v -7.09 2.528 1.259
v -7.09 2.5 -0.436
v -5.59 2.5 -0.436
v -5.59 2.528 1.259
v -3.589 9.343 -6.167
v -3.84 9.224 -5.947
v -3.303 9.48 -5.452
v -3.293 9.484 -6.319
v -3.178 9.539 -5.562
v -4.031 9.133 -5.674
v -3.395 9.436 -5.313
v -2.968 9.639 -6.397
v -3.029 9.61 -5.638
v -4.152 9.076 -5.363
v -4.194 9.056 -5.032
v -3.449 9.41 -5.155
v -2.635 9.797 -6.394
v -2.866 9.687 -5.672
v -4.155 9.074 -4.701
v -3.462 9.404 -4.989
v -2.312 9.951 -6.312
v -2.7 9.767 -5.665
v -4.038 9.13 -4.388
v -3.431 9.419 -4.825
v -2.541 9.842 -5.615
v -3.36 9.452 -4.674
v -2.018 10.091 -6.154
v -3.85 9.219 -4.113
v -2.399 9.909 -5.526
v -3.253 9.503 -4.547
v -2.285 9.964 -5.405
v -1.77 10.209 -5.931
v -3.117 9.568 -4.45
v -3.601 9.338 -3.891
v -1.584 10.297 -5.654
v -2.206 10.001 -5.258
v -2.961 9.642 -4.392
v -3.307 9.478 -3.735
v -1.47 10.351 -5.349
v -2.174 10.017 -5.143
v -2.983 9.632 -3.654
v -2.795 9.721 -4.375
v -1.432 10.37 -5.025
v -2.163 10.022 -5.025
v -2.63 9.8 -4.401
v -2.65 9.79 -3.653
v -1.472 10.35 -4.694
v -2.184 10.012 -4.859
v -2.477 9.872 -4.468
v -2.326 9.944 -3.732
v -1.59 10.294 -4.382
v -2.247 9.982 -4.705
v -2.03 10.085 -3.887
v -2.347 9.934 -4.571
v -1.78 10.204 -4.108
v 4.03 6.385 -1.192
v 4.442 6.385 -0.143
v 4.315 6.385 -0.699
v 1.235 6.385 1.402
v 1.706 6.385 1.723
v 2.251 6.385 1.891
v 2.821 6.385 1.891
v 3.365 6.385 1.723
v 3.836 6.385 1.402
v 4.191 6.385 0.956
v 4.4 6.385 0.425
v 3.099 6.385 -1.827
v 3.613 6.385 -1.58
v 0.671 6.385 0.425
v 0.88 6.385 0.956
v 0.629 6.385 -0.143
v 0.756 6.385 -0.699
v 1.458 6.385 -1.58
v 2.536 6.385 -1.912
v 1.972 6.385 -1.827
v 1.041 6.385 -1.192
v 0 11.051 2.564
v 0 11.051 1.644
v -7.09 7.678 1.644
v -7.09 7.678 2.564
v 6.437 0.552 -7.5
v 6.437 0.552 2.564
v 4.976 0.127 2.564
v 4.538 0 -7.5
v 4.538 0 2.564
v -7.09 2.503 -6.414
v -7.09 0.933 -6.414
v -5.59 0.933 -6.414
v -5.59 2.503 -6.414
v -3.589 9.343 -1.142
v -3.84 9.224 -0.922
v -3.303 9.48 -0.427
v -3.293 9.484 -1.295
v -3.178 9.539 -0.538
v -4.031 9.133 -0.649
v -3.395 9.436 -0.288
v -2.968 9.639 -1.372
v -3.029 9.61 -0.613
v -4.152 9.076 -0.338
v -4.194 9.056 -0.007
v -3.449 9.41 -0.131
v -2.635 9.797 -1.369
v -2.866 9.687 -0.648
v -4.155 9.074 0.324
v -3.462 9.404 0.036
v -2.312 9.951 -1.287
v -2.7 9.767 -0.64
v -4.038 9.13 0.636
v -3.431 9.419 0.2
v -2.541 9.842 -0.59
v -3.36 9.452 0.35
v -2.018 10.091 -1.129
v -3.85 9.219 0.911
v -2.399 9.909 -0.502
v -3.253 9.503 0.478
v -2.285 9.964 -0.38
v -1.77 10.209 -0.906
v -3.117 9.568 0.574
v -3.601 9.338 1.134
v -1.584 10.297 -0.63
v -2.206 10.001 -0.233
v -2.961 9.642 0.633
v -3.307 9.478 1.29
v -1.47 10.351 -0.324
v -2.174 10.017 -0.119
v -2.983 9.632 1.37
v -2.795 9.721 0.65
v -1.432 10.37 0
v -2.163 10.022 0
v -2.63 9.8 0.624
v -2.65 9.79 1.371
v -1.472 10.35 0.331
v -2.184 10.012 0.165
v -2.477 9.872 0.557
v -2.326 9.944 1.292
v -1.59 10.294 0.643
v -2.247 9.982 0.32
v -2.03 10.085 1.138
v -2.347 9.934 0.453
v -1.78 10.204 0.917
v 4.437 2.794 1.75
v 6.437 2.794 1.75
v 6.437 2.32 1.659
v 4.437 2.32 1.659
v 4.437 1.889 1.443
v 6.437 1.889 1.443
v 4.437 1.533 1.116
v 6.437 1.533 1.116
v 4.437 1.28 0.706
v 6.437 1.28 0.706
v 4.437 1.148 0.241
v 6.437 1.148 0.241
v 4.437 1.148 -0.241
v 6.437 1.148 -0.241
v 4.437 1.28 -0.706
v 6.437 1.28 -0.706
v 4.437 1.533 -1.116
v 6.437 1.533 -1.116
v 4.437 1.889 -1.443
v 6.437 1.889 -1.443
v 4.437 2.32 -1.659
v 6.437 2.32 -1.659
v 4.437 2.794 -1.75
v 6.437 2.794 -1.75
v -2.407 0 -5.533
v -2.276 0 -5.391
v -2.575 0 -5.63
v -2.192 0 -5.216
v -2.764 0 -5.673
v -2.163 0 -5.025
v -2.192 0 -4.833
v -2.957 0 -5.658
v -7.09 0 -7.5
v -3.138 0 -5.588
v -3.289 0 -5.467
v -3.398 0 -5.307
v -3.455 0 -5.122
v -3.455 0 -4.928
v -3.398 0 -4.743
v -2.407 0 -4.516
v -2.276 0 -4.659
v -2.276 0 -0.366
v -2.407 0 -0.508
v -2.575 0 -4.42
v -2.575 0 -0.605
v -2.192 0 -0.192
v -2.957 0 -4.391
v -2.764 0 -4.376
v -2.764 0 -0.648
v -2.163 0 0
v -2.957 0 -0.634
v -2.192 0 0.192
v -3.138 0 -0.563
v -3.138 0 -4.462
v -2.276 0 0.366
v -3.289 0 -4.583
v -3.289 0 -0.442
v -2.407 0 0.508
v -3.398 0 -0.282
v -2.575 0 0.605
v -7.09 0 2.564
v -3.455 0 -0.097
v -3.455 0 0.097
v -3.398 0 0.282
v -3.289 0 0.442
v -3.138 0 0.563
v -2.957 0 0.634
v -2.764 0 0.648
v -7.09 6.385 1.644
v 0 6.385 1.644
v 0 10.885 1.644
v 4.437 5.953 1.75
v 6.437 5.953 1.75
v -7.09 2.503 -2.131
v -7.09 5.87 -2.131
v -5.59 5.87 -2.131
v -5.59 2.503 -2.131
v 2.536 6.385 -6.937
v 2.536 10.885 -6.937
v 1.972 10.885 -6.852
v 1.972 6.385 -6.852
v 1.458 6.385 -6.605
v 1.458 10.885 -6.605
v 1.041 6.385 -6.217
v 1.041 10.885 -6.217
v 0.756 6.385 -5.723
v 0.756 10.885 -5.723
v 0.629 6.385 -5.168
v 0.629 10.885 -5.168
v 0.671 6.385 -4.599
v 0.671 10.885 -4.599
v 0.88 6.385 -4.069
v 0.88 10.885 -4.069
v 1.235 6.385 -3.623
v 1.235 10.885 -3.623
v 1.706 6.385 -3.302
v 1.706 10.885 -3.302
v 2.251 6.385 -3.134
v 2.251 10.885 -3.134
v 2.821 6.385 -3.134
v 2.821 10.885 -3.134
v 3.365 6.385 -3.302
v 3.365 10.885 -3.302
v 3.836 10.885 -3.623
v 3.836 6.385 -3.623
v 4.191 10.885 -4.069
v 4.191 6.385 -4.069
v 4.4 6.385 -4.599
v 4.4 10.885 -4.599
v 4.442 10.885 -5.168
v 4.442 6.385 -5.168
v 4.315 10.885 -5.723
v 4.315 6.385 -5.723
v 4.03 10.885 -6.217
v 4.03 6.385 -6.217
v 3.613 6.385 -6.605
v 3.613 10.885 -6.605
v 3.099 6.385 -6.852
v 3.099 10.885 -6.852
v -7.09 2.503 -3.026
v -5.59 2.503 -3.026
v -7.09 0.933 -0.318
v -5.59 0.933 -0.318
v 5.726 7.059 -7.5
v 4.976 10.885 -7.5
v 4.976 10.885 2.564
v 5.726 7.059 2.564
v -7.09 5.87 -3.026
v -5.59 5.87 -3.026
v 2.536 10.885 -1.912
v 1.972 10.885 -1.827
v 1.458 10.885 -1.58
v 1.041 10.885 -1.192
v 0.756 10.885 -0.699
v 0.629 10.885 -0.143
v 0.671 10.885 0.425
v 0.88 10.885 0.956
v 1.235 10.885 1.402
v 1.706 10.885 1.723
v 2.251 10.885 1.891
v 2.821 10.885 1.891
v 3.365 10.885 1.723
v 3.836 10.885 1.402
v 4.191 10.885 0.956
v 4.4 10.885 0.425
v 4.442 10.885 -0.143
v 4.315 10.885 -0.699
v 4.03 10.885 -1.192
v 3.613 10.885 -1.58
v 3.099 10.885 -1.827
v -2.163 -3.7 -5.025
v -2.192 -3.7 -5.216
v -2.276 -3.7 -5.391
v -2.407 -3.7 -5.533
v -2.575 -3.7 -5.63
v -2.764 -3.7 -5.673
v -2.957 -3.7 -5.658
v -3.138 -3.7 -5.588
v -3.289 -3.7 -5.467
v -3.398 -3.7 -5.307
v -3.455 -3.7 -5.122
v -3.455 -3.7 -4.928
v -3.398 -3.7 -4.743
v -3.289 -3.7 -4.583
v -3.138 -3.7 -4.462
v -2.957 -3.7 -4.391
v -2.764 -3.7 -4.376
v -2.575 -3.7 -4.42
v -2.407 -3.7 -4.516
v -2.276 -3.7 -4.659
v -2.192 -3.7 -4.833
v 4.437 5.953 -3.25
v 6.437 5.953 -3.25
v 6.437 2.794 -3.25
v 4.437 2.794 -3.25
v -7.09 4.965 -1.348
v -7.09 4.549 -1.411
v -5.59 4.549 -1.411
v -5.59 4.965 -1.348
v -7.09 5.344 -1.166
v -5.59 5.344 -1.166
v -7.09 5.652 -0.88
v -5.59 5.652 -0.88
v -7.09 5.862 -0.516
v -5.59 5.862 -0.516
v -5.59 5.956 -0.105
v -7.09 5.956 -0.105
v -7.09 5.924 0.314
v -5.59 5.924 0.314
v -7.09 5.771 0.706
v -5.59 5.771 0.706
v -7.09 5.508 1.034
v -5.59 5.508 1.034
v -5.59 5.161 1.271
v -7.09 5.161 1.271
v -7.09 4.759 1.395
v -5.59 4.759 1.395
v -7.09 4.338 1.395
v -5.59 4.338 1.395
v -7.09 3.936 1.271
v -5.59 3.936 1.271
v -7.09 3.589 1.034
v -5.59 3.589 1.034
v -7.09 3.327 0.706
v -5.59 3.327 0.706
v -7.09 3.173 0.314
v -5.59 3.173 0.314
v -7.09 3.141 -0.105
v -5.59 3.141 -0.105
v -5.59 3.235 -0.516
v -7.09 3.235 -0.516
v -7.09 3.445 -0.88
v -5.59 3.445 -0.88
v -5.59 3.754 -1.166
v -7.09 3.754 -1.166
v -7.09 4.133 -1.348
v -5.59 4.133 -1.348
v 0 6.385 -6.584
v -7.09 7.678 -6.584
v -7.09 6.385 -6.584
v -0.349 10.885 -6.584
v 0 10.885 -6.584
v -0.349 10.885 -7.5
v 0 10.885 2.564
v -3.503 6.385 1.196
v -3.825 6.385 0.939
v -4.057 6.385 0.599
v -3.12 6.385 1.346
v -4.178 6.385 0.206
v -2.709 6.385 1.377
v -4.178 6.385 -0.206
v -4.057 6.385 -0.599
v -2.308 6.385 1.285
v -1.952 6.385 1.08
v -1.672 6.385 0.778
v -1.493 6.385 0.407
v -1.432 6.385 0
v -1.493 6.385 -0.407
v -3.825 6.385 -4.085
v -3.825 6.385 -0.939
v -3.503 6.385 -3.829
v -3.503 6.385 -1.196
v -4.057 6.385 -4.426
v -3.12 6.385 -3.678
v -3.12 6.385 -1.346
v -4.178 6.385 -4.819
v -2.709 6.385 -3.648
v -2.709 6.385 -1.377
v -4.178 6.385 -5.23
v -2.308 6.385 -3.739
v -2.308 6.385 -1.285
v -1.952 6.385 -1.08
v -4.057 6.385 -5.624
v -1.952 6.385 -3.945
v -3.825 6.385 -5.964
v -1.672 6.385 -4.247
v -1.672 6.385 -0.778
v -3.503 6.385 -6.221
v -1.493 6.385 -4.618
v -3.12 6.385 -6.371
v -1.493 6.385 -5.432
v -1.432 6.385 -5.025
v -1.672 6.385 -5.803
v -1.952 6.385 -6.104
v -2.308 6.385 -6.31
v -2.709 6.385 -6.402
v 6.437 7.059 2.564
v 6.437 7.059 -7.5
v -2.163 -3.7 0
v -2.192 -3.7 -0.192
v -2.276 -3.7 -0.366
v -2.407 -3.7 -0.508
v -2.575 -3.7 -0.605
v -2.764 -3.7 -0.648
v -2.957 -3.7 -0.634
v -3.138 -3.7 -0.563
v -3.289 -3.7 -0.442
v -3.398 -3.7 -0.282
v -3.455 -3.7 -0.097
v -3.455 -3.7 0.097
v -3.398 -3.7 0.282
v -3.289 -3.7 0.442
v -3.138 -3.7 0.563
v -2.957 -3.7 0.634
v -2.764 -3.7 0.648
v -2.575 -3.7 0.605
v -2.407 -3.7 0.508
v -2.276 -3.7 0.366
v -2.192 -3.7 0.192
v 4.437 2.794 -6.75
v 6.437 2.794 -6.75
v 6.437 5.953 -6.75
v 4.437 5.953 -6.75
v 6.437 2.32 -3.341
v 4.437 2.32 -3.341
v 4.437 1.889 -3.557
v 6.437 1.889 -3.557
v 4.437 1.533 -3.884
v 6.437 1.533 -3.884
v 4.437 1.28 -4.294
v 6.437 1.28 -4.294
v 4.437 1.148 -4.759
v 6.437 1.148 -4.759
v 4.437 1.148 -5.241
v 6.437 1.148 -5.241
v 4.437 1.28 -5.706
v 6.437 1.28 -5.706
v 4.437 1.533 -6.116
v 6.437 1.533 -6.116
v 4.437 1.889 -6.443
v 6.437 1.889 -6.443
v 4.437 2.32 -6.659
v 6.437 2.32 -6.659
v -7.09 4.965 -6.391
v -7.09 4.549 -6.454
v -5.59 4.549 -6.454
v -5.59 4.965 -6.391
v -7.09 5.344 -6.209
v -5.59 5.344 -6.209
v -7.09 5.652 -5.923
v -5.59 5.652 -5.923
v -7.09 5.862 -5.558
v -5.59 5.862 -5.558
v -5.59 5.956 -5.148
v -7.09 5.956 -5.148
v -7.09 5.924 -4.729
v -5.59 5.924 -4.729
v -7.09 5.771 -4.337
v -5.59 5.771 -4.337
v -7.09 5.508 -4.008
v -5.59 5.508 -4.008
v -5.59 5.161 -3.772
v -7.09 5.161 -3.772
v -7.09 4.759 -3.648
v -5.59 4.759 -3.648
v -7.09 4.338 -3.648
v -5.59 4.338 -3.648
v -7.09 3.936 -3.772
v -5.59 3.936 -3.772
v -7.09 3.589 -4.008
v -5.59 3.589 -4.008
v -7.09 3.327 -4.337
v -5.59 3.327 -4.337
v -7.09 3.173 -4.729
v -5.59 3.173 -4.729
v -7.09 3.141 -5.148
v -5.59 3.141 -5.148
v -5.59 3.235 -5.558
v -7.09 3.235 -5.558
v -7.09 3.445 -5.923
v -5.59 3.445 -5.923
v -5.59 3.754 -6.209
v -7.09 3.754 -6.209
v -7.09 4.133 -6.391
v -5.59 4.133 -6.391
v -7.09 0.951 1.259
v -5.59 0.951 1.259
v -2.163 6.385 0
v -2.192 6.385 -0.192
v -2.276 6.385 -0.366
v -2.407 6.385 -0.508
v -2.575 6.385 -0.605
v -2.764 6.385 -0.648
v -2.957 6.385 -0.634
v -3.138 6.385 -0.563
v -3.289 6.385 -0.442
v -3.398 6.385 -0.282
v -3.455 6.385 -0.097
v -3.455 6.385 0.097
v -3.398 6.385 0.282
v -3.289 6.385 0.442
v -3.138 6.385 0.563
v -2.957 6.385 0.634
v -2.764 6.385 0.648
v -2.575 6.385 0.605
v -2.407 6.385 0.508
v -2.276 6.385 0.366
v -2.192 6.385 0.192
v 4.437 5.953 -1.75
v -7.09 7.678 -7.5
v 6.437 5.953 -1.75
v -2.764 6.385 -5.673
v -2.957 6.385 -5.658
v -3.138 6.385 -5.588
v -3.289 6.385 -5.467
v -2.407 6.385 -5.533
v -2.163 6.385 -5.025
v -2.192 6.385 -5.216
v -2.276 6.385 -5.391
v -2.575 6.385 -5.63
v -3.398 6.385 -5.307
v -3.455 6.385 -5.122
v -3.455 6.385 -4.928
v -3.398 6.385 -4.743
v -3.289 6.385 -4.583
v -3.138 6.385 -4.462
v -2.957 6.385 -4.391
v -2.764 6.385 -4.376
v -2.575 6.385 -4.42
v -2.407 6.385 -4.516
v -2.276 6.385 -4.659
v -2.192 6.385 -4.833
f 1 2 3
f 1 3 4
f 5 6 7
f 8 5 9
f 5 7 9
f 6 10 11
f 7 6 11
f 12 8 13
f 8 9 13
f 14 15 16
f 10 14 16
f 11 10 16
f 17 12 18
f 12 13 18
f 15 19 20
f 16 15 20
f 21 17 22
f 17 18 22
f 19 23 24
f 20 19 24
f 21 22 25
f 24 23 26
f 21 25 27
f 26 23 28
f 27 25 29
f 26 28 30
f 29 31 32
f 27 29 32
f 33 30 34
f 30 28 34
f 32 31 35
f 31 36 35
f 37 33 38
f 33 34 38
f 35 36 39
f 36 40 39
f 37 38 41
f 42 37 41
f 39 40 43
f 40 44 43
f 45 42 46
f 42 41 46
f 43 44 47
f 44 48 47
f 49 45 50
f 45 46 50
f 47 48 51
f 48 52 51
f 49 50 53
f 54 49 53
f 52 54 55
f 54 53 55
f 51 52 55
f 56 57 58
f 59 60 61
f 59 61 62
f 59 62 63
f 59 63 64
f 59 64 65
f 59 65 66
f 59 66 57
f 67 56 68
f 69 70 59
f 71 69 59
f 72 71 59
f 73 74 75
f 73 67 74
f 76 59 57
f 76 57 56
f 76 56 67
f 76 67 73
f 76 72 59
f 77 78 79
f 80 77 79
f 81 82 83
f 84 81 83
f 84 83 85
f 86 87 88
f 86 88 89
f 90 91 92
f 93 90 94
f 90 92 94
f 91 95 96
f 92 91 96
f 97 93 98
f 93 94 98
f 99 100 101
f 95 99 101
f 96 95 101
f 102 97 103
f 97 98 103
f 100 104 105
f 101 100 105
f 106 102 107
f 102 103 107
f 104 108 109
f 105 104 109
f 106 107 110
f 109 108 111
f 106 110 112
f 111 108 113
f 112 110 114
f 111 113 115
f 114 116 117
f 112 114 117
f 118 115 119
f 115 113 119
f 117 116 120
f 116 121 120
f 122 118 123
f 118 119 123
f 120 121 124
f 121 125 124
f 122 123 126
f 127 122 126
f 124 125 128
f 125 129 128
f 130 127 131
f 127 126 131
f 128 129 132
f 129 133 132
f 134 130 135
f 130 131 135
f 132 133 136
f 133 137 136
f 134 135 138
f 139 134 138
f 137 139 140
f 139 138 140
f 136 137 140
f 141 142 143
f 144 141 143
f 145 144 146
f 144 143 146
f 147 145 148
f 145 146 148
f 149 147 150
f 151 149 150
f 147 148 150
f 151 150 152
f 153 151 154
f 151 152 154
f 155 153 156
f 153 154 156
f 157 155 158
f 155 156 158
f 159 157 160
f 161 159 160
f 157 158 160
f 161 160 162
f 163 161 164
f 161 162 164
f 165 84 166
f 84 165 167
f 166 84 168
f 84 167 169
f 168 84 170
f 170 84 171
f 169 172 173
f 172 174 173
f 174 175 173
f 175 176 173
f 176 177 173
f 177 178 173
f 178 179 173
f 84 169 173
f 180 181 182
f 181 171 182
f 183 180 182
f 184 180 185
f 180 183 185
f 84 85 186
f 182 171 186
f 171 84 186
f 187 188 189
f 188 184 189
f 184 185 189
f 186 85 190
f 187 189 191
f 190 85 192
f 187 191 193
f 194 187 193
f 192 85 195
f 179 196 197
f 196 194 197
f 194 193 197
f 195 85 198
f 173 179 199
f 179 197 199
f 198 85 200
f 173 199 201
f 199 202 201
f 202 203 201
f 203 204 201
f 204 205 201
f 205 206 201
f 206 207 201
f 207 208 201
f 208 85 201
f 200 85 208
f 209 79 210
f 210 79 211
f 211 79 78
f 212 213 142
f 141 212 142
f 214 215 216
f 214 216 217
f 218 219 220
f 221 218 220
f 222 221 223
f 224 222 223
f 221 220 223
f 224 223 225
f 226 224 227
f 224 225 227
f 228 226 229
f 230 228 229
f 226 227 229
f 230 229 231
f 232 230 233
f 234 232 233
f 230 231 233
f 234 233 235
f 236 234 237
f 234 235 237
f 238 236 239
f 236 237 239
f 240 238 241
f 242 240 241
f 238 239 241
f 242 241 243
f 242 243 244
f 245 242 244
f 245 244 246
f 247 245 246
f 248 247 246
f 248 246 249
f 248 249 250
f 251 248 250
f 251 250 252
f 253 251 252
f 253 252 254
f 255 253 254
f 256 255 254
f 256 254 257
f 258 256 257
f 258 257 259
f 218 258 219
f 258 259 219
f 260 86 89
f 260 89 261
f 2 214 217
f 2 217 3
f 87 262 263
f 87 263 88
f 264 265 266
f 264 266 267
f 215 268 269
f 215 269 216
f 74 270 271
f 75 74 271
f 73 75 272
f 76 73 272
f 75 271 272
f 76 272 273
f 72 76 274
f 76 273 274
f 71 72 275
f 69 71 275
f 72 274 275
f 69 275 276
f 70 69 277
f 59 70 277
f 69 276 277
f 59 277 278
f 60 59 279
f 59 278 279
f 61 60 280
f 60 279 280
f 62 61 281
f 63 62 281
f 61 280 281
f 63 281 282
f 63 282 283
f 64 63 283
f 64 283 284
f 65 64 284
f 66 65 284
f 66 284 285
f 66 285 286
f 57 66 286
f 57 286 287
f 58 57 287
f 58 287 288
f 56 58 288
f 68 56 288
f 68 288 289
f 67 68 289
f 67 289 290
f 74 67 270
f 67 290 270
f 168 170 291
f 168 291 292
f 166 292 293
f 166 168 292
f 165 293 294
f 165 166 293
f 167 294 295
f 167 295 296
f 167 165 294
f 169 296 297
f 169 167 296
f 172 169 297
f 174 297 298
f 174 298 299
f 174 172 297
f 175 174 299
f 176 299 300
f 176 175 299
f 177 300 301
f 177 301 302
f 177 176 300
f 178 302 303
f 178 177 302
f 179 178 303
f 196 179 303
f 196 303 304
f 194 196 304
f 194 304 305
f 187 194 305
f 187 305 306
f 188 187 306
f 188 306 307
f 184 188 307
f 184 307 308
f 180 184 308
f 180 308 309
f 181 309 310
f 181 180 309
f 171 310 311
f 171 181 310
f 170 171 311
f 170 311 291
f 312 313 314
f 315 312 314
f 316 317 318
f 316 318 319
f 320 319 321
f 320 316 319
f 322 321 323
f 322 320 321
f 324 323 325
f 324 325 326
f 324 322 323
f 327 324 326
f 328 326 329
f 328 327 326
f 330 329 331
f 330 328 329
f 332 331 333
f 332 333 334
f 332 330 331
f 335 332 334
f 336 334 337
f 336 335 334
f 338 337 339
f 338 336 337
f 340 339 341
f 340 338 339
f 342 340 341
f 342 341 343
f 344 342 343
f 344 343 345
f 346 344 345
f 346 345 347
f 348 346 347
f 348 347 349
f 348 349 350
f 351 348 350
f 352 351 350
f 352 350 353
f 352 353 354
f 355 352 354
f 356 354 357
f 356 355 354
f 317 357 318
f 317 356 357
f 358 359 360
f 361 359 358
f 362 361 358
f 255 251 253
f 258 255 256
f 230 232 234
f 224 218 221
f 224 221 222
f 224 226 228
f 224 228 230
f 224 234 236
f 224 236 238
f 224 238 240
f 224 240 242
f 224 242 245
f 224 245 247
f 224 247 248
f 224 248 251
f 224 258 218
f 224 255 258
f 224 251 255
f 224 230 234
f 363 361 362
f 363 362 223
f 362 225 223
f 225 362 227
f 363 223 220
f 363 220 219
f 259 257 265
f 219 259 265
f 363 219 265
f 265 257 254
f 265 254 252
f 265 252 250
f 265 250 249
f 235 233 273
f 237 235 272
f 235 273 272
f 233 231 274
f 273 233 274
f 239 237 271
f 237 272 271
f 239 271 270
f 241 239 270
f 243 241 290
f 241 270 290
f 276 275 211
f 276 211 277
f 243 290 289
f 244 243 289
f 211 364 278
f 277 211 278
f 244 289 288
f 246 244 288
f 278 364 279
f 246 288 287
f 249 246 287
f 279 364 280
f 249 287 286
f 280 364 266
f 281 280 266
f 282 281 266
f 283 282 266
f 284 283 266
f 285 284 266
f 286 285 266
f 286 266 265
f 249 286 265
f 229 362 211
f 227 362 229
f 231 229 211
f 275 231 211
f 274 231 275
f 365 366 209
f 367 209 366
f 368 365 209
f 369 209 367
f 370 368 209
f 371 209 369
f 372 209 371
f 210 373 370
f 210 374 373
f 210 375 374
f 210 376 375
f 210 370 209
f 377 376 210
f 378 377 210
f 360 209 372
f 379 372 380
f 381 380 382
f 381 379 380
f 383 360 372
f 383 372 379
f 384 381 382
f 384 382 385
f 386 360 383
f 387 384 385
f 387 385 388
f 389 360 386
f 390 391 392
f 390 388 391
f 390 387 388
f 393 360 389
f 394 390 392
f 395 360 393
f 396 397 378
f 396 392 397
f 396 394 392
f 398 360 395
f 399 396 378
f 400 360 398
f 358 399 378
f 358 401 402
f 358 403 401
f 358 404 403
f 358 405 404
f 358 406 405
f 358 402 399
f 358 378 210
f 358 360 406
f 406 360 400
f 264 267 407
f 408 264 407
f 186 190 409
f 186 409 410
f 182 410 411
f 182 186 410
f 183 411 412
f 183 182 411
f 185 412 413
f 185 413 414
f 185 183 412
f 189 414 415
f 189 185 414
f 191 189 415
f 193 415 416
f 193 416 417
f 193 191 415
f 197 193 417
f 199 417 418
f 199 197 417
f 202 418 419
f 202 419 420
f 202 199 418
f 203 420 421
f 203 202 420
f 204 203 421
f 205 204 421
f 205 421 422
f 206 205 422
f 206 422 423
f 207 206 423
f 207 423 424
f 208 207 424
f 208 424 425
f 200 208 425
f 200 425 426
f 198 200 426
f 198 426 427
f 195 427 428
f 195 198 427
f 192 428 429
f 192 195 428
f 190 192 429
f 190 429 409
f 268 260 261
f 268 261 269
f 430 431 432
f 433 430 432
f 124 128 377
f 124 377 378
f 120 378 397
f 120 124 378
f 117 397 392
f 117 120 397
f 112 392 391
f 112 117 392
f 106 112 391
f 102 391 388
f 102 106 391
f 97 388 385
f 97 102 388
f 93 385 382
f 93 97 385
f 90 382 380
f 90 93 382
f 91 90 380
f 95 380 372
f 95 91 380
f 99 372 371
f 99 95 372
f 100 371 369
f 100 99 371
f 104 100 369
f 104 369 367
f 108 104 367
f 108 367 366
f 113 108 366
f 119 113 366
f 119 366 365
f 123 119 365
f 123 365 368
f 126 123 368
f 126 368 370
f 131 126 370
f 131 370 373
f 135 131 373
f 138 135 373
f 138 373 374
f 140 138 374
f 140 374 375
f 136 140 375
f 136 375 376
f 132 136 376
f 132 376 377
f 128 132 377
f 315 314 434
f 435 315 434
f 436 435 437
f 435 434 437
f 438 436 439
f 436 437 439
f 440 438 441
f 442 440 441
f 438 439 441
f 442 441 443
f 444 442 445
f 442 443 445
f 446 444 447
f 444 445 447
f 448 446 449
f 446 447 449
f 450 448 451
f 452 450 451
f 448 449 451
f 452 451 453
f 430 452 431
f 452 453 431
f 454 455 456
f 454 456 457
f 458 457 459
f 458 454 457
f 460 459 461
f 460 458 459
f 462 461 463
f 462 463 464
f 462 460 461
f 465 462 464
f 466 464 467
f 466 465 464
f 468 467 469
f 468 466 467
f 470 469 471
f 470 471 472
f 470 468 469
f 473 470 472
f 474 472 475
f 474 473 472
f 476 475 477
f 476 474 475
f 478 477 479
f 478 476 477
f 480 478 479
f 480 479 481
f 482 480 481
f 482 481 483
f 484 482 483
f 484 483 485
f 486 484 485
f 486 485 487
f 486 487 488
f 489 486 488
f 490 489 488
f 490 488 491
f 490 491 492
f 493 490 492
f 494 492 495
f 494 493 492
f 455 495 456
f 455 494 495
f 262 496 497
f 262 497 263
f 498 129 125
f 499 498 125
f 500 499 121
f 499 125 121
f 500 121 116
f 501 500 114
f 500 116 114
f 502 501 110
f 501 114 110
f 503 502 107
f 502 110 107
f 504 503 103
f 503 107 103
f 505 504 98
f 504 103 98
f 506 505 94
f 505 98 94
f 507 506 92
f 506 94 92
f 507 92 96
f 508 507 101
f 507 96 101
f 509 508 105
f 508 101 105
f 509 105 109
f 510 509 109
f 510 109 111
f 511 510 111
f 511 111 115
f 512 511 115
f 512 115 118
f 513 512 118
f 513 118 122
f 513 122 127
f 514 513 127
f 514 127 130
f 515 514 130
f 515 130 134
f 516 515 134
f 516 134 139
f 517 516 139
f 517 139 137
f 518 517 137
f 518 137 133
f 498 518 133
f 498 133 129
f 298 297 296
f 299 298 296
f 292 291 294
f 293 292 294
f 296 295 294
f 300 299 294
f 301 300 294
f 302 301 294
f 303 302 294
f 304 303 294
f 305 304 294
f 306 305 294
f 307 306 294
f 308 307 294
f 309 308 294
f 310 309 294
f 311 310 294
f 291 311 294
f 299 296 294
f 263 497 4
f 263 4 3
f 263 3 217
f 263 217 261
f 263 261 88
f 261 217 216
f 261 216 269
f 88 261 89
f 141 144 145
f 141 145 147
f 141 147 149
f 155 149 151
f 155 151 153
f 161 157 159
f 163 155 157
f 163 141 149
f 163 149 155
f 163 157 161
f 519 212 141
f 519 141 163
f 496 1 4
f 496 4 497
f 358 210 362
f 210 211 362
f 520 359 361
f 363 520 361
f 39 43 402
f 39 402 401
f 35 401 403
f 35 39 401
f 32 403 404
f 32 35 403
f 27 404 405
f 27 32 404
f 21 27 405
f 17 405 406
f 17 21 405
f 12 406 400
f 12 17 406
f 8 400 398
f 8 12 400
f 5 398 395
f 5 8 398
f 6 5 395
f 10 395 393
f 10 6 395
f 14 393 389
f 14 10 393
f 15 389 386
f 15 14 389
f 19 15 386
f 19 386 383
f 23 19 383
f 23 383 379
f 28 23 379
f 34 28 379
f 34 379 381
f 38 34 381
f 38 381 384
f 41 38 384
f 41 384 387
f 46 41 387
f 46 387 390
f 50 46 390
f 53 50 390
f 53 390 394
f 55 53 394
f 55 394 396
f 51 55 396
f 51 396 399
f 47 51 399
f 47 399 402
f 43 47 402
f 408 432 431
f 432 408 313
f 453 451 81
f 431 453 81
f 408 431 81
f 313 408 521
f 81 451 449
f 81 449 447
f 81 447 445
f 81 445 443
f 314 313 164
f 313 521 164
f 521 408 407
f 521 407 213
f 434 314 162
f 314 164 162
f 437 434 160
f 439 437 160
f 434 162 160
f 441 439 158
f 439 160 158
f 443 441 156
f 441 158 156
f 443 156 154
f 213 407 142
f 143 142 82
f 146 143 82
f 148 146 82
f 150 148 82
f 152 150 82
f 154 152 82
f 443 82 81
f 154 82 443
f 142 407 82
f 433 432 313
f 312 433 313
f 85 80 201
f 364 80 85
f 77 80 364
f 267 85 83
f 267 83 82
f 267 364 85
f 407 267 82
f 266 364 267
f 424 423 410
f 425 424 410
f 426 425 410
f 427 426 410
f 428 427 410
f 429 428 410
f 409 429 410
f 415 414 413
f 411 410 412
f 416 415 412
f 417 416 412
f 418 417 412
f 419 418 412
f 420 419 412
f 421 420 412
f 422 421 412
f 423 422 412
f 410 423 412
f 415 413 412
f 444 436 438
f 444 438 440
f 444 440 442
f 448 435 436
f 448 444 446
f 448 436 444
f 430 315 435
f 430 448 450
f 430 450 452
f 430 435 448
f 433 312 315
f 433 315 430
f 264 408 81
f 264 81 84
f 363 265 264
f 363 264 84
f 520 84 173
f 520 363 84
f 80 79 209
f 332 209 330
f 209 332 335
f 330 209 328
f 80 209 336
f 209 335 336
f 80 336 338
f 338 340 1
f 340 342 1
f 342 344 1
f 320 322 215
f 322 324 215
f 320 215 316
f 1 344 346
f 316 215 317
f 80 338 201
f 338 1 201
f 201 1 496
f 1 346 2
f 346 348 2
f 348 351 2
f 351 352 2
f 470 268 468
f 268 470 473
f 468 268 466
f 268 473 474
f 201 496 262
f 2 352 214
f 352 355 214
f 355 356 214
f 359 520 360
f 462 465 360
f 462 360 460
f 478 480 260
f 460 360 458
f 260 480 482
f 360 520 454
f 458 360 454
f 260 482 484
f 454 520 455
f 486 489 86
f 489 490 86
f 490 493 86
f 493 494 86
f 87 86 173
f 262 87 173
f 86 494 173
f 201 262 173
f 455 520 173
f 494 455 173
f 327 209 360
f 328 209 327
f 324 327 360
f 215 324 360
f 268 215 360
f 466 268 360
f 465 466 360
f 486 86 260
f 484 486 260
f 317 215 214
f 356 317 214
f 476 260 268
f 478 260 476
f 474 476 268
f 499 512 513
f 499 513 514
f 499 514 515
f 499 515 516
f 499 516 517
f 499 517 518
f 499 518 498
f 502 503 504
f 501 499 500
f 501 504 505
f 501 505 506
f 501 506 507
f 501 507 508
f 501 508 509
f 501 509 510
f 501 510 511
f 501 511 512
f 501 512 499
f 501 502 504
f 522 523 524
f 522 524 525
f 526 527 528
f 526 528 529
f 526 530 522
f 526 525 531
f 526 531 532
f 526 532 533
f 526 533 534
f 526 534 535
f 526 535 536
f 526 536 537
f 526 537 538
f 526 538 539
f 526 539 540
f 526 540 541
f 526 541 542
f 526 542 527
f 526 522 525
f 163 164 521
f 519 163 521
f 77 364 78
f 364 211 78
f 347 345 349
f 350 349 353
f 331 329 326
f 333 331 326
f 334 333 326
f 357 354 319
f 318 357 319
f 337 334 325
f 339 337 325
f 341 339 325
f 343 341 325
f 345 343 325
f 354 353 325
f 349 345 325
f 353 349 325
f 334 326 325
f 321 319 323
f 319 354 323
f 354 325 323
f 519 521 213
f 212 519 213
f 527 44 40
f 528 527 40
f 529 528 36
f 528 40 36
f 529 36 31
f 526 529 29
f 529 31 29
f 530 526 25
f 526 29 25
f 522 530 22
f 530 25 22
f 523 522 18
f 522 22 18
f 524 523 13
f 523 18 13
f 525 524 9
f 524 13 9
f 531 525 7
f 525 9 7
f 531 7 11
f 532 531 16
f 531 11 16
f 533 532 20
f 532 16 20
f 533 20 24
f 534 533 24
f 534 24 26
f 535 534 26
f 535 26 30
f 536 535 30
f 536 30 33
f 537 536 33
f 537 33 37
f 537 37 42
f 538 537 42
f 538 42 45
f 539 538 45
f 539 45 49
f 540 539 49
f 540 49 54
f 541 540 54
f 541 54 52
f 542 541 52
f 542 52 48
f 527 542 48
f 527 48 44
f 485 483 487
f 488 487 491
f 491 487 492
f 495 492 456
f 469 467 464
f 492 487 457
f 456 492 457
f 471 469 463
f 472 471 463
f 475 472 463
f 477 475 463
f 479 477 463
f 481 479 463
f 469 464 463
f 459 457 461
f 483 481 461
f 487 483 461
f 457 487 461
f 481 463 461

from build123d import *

# Parameters (mm, degrees)
EXTRUDE_1_DEPTH     = 7.5
CUT_EXTRUDE_START   = 10.884514
SKETCH_2_R          = 1.912136214
SKETCH_2_W          = 7.090261775
SKETCH_2_H          = 13.093091483
SKETCH_2_R_2        = 1.380933403
SKETCH_2_R_3        = 0.65
CUT_EXTRUDE_1_DEPTH = 4.5
CUT_EXTRUDE_2_DEPTH = 2
SKETCH_2_6_R        = 0.65
EXTRUDE_3_DEPTH     = 3.7
CUT_EXTRUDE_START_2 = -7.090262
SKETCH_4_R          = 1.411151221
SKETCH_4_R_2        = 0.775543873
CUT_EXTRUDE_3_DEPTH = 1.5
SKETCH_5_W          = 1.46101298
SKETCH_5_H          = 4.936486251
SKETCH_5_R          = 1.912136214
CUT_EXTRUDE_4_DEPTH = 18.867005063
EXTRUDE_START       = 1.643513749
EXTRUDE_4_DEPTH     = 0.92


# Read off the part's stored shape, not the designer's step: Бобышка-Вытянуть4
with BuildPart() as part:
    # Эскиз1 → Бобышка-Вытянуть1 (new, symmetric)
    with BuildSketch(Plane.XY):
        Polygon((-7.090261775, 0), (-7.090261775, 7.678308116), (-0.349095572, 10.884514209), (4.975912264, 10.884514209), (5.725642609, 7.058967063), (6.436925244, 7.058967063), (6.436925244, 0.551631224), (4.538262875, 0), align=None)
    extrude(amount=EXTRUDE_1_DEPTH, both=True)

    # Эскиз2 → Вырез-Вытянуть1 (cut)
    # profile 1 of 7: a face of its own
    with BuildSketch(Plane(origin=(0, 0, 0), x_dir=(1, 0, 0), z_dir=(0, 1, 0)).offset(CUT_EXTRUDE_START)):
        with Locations(Location((2.535525991, 5.024679523, 0), (0, 0, 90))):
            Circle(SKETCH_2_R)
    # profile 2 of 7: a face of its own
    with BuildSketch(Plane(origin=(0, 0, 0), x_dir=(1, 0, 0), z_dir=(0, 1, 0)).offset(CUT_EXTRUDE_START)):
        with Locations(Location((2.535525991, 0, 0), (0, 0, 90))):
            Circle(SKETCH_2_R)
    # profile 3 of 7: a face of its own
    with BuildSketch(Plane(origin=(0, 0, 0), x_dir=(1, 0, 0), z_dir=(0, 1, 0)).offset(CUT_EXTRUDE_START)):
        with Locations(Location((2.535525991, -5.063513749, 0), (0, 0, 90))):
            Circle(SKETCH_2_R)
    # profile 4 of 7: a face of its own
    with BuildSketch(Plane(origin=(0, 0, 0), x_dir=(1, 0, 0), z_dir=(0, 1, 0)).offset(CUT_EXTRUDE_START)):
        with Locations((-3.545130888, 0.03776166)):
            Rectangle(SKETCH_2_W, SKETCH_2_H)
        with Locations((-2.812641214, -5.063513749)):
            Circle(SKETCH_2_R_2, mode=Mode.SUBTRACT)
        with Locations((-2.812641214, 0)):
            Circle(SKETCH_2_R_2, mode=Mode.SUBTRACT)
        with Locations((-2.812641214, 5.024679523)):
            Circle(SKETCH_2_R_2, mode=Mode.SUBTRACT)
    # profile 5 of 7: a face of its own
    with BuildSketch(Plane(origin=(0, 0, 0), x_dir=(1, 0, 0), z_dir=(0, 1, 0)).offset(CUT_EXTRUDE_START)):
        with Locations((-2.812641214, -5.063513749)):
            Circle(SKETCH_2_R_3)
    # profile 6 of 7: a face of its own
    with BuildSketch(Plane(origin=(0, 0, 0), x_dir=(1, 0, 0), z_dir=(0, 1, 0)).offset(CUT_EXTRUDE_START)):
        with Locations((-2.812641214, 0)):
            Circle(SKETCH_2_R_3)
    # profile 7 of 7: a face of its own
    with BuildSketch(Plane(origin=(0, 0, 0), x_dir=(1, 0, 0), z_dir=(0, 1, 0)).offset(CUT_EXTRUDE_START)):
        with Locations((-2.812641214, 5.024679523)):
            Circle(SKETCH_2_R_3)
    extrude(amount=-CUT_EXTRUDE_1_DEPTH, mode=Mode.SUBTRACT)

    # Эскиз3 → Вырез-Вытянуть2 (cut)
    with BuildSketch(Plane(origin=(6.436925244, 0, 0), x_dir=(0, 0, -1), z_dir=(1, 0, 0))):
        with BuildLine():
            Line((1.75, 5.953109404), (-1.75, 5.953109404))
            Line((-1.75, 5.953109404), (-1.75, 2.794090542))
            ThreePointArc((-1.75, 2.794090542), (0, 1.131399682), (1.75, 2.794090542))
            Line((1.75, 2.794090542), (1.75, 5.953109404))
        make_face()
        with BuildLine():
            Line((3.25, 5.953109404), (3.25, 2.794090542))
            ThreePointArc((3.25, 2.794090542), (5, 1.131399682), (6.75, 2.794090542))
            Line((6.75, 2.794090542), (6.75, 5.953109404))
            Line((6.75, 5.953109404), (3.25, 5.953109404))
        make_face()
        with BuildLine():
            Line((-6.75, 5.953109404), (-6.75, 2.794090542))
            ThreePointArc((-6.75, 2.794090542), (-5, 1.131399682), (-3.25, 2.794090542))
            Line((-3.25, 2.794090542), (-3.25, 5.953109404))
            Line((-3.25, 5.953109404), (-6.75, 5.953109404))
        make_face()
    extrude(amount=-CUT_EXTRUDE_2_DEPTH, mode=Mode.SUBTRACT)

    # Эскиз2<6> → Бобышка-Вытянуть3 (add)
    with BuildSketch(Plane(origin=(0, 0, 0), x_dir=(1, 0, 0), z_dir=(0, 1, 0))):
        with Locations((-2.812641214, 5.024679523)):
            Circle(SKETCH_2_6_R)
        with Locations((-2.812641214, 0)):
            Circle(SKETCH_2_6_R)
        with Locations((-2.812641214, -5.063513749)):
            Circle(SKETCH_2_6_R)
    extrude(amount=-EXTRUDE_3_DEPTH)

    # Эскиз4 → Вырез-Вытянуть3 (cut)
    # profile 1 of 7: a face of its own
    with BuildSketch(Plane(origin=(0, 0, 0), x_dir=(0, 0, -1), z_dir=(1, 0, 0)).offset(CUT_EXTRUDE_START_2)):
        with Locations((5.042912497, 4.548641576)):
            Circle(SKETCH_4_R)
        with Locations((5.042912497, 4.548641576)):
            Circle(SKETCH_4_R_2, mode=Mode.SUBTRACT)
    # profile 2 of 7: a face of its own
    with BuildSketch(Plane(origin=(0, 0, 0), x_dir=(0, 0, -1), z_dir=(1, 0, 0)).offset(CUT_EXTRUDE_START_2)):
        with Locations((5.042912497, 4.548641576)):
            Circle(SKETCH_4_R_2)
    # profile 3 of 7: a face of its own
    with BuildSketch(Plane(origin=(0, 0, 0), x_dir=(0, 0, -1), z_dir=(1, 0, 0)).offset(CUT_EXTRUDE_START_2)):
        with Locations((0, 4.548641576)):
            Circle(SKETCH_4_R)
        with Locations((0, 4.548641576)):
            Circle(SKETCH_4_R_2, mode=Mode.SUBTRACT)
    # profile 4 of 7: a face of its own
    with BuildSketch(Plane(origin=(0, 0, 0), x_dir=(0, 0, -1), z_dir=(1, 0, 0)).offset(CUT_EXTRUDE_START_2)):
        with Locations((0, 4.548641576)):
            Circle(SKETCH_4_R_2)
    # profile 5 of 7: a face of its own
    with BuildSketch(Plane(origin=(0, 0, 0), x_dir=(0, 0, -1), z_dir=(1, 0, 0)).offset(CUT_EXTRUDE_START_2)):
        with Locations((-5.053327676, 4.548641576)):
            Circle(SKETCH_4_R)
        with Locations((-5.053327676, 4.548641576)):
            Circle(SKETCH_4_R_2, mode=Mode.SUBTRACT)
    # profile 6 of 7: a face of its own
    with BuildSketch(Plane(origin=(0, 0, 0), x_dir=(0, 0, -1), z_dir=(1, 0, 0)).offset(CUT_EXTRUDE_START_2)):
        with Locations((-5.053327676, 4.548641576)):
            Circle(SKETCH_4_R_2)
    # profile 7 of 7: a face of its own
    with BuildSketch(Plane(origin=(0, 0, 0), x_dir=(0, 0, -1), z_dir=(1, 0, 0)).offset(CUT_EXTRUDE_START_2)):
        Polygon((6.413915436, 2.503175658), (3.026112508, 2.503175658), (3.026112508, 5.869671649), (2.131221168, 5.869671649), (2.131221168, 2.503175658), (0.436105724, 2.500060238), (-1.258778832, 2.528210165), (-1.258778832, 0.951386535), (0.31785264, 0.932735686), (6.413915436, 0.932735686), align=None)
    extrude(amount=CUT_EXTRUDE_3_DEPTH, mode=Mode.SUBTRACT)

    # Эскиз5 → Вырез-Вытянуть4 (cut, through all)
    # profile 1 of 4: a face of its own
    with BuildSketch(Plane(origin=(0, 10.884514209, 0), x_dir=(1, 0, 0), z_dir=(0, 1, 0))):
        Polygon((0, -2.563513749), (-7.090261775, -2.563513749), (-7.090261775, -7.5), (-0.349095572, -7.5), (-0.349095572, -6.508784082), (0, -6.508784082), align=None)
    # profile 2 of 4: a face of its own
    with BuildSketch(Plane(origin=(0, 10.884514209, 0), x_dir=(1, 0, 0), z_dir=(0, 1, 0))):
        with Locations((5.706418754, -5.031756875)):
            Rectangle(SKETCH_5_W, SKETCH_5_H)
    # profile 3 of 4: a face of its own
    with BuildSketch(Plane(origin=(0, 10.884514209, 0), x_dir=(1, 0, 0), z_dir=(0, 1, 0))):
        Polygon((4.975912264, -2.563513749), (0, -2.563513749), (0, -6.508784082), (-0.349095572, -6.508784082), (-0.349095572, -7.5), (4.975912264, -7.5), align=None)
        with Locations((2.535525991, -5.063513749)):
            Circle(SKETCH_5_R, mode=Mode.SUBTRACT)
    # profile 4 of 4: a face of its own
    with BuildSketch(Plane(origin=(0, 10.884514209, 0), x_dir=(1, 0, 0), z_dir=(0, 1, 0))):
        with Locations((2.535525991, -5.063513749)):
            Circle(SKETCH_5_R)
    extrude(amount=-CUT_EXTRUDE_4_DEPTH, mode=Mode.SUBTRACT)

    # Бобышка-Вытянуть4 outline → Бобышка-Вытянуть4 (add)
    with BuildSketch(Plane.XY.offset(EXTRUDE_START)):
        Polygon((-7.090261775, 7.678308116), (-7.090261775, 6.384514209), (0, 6.384514209), (0, 11.050549627), align=None)
    extrude(amount=EXTRUDE_4_DEPTH)


solid = part.part
